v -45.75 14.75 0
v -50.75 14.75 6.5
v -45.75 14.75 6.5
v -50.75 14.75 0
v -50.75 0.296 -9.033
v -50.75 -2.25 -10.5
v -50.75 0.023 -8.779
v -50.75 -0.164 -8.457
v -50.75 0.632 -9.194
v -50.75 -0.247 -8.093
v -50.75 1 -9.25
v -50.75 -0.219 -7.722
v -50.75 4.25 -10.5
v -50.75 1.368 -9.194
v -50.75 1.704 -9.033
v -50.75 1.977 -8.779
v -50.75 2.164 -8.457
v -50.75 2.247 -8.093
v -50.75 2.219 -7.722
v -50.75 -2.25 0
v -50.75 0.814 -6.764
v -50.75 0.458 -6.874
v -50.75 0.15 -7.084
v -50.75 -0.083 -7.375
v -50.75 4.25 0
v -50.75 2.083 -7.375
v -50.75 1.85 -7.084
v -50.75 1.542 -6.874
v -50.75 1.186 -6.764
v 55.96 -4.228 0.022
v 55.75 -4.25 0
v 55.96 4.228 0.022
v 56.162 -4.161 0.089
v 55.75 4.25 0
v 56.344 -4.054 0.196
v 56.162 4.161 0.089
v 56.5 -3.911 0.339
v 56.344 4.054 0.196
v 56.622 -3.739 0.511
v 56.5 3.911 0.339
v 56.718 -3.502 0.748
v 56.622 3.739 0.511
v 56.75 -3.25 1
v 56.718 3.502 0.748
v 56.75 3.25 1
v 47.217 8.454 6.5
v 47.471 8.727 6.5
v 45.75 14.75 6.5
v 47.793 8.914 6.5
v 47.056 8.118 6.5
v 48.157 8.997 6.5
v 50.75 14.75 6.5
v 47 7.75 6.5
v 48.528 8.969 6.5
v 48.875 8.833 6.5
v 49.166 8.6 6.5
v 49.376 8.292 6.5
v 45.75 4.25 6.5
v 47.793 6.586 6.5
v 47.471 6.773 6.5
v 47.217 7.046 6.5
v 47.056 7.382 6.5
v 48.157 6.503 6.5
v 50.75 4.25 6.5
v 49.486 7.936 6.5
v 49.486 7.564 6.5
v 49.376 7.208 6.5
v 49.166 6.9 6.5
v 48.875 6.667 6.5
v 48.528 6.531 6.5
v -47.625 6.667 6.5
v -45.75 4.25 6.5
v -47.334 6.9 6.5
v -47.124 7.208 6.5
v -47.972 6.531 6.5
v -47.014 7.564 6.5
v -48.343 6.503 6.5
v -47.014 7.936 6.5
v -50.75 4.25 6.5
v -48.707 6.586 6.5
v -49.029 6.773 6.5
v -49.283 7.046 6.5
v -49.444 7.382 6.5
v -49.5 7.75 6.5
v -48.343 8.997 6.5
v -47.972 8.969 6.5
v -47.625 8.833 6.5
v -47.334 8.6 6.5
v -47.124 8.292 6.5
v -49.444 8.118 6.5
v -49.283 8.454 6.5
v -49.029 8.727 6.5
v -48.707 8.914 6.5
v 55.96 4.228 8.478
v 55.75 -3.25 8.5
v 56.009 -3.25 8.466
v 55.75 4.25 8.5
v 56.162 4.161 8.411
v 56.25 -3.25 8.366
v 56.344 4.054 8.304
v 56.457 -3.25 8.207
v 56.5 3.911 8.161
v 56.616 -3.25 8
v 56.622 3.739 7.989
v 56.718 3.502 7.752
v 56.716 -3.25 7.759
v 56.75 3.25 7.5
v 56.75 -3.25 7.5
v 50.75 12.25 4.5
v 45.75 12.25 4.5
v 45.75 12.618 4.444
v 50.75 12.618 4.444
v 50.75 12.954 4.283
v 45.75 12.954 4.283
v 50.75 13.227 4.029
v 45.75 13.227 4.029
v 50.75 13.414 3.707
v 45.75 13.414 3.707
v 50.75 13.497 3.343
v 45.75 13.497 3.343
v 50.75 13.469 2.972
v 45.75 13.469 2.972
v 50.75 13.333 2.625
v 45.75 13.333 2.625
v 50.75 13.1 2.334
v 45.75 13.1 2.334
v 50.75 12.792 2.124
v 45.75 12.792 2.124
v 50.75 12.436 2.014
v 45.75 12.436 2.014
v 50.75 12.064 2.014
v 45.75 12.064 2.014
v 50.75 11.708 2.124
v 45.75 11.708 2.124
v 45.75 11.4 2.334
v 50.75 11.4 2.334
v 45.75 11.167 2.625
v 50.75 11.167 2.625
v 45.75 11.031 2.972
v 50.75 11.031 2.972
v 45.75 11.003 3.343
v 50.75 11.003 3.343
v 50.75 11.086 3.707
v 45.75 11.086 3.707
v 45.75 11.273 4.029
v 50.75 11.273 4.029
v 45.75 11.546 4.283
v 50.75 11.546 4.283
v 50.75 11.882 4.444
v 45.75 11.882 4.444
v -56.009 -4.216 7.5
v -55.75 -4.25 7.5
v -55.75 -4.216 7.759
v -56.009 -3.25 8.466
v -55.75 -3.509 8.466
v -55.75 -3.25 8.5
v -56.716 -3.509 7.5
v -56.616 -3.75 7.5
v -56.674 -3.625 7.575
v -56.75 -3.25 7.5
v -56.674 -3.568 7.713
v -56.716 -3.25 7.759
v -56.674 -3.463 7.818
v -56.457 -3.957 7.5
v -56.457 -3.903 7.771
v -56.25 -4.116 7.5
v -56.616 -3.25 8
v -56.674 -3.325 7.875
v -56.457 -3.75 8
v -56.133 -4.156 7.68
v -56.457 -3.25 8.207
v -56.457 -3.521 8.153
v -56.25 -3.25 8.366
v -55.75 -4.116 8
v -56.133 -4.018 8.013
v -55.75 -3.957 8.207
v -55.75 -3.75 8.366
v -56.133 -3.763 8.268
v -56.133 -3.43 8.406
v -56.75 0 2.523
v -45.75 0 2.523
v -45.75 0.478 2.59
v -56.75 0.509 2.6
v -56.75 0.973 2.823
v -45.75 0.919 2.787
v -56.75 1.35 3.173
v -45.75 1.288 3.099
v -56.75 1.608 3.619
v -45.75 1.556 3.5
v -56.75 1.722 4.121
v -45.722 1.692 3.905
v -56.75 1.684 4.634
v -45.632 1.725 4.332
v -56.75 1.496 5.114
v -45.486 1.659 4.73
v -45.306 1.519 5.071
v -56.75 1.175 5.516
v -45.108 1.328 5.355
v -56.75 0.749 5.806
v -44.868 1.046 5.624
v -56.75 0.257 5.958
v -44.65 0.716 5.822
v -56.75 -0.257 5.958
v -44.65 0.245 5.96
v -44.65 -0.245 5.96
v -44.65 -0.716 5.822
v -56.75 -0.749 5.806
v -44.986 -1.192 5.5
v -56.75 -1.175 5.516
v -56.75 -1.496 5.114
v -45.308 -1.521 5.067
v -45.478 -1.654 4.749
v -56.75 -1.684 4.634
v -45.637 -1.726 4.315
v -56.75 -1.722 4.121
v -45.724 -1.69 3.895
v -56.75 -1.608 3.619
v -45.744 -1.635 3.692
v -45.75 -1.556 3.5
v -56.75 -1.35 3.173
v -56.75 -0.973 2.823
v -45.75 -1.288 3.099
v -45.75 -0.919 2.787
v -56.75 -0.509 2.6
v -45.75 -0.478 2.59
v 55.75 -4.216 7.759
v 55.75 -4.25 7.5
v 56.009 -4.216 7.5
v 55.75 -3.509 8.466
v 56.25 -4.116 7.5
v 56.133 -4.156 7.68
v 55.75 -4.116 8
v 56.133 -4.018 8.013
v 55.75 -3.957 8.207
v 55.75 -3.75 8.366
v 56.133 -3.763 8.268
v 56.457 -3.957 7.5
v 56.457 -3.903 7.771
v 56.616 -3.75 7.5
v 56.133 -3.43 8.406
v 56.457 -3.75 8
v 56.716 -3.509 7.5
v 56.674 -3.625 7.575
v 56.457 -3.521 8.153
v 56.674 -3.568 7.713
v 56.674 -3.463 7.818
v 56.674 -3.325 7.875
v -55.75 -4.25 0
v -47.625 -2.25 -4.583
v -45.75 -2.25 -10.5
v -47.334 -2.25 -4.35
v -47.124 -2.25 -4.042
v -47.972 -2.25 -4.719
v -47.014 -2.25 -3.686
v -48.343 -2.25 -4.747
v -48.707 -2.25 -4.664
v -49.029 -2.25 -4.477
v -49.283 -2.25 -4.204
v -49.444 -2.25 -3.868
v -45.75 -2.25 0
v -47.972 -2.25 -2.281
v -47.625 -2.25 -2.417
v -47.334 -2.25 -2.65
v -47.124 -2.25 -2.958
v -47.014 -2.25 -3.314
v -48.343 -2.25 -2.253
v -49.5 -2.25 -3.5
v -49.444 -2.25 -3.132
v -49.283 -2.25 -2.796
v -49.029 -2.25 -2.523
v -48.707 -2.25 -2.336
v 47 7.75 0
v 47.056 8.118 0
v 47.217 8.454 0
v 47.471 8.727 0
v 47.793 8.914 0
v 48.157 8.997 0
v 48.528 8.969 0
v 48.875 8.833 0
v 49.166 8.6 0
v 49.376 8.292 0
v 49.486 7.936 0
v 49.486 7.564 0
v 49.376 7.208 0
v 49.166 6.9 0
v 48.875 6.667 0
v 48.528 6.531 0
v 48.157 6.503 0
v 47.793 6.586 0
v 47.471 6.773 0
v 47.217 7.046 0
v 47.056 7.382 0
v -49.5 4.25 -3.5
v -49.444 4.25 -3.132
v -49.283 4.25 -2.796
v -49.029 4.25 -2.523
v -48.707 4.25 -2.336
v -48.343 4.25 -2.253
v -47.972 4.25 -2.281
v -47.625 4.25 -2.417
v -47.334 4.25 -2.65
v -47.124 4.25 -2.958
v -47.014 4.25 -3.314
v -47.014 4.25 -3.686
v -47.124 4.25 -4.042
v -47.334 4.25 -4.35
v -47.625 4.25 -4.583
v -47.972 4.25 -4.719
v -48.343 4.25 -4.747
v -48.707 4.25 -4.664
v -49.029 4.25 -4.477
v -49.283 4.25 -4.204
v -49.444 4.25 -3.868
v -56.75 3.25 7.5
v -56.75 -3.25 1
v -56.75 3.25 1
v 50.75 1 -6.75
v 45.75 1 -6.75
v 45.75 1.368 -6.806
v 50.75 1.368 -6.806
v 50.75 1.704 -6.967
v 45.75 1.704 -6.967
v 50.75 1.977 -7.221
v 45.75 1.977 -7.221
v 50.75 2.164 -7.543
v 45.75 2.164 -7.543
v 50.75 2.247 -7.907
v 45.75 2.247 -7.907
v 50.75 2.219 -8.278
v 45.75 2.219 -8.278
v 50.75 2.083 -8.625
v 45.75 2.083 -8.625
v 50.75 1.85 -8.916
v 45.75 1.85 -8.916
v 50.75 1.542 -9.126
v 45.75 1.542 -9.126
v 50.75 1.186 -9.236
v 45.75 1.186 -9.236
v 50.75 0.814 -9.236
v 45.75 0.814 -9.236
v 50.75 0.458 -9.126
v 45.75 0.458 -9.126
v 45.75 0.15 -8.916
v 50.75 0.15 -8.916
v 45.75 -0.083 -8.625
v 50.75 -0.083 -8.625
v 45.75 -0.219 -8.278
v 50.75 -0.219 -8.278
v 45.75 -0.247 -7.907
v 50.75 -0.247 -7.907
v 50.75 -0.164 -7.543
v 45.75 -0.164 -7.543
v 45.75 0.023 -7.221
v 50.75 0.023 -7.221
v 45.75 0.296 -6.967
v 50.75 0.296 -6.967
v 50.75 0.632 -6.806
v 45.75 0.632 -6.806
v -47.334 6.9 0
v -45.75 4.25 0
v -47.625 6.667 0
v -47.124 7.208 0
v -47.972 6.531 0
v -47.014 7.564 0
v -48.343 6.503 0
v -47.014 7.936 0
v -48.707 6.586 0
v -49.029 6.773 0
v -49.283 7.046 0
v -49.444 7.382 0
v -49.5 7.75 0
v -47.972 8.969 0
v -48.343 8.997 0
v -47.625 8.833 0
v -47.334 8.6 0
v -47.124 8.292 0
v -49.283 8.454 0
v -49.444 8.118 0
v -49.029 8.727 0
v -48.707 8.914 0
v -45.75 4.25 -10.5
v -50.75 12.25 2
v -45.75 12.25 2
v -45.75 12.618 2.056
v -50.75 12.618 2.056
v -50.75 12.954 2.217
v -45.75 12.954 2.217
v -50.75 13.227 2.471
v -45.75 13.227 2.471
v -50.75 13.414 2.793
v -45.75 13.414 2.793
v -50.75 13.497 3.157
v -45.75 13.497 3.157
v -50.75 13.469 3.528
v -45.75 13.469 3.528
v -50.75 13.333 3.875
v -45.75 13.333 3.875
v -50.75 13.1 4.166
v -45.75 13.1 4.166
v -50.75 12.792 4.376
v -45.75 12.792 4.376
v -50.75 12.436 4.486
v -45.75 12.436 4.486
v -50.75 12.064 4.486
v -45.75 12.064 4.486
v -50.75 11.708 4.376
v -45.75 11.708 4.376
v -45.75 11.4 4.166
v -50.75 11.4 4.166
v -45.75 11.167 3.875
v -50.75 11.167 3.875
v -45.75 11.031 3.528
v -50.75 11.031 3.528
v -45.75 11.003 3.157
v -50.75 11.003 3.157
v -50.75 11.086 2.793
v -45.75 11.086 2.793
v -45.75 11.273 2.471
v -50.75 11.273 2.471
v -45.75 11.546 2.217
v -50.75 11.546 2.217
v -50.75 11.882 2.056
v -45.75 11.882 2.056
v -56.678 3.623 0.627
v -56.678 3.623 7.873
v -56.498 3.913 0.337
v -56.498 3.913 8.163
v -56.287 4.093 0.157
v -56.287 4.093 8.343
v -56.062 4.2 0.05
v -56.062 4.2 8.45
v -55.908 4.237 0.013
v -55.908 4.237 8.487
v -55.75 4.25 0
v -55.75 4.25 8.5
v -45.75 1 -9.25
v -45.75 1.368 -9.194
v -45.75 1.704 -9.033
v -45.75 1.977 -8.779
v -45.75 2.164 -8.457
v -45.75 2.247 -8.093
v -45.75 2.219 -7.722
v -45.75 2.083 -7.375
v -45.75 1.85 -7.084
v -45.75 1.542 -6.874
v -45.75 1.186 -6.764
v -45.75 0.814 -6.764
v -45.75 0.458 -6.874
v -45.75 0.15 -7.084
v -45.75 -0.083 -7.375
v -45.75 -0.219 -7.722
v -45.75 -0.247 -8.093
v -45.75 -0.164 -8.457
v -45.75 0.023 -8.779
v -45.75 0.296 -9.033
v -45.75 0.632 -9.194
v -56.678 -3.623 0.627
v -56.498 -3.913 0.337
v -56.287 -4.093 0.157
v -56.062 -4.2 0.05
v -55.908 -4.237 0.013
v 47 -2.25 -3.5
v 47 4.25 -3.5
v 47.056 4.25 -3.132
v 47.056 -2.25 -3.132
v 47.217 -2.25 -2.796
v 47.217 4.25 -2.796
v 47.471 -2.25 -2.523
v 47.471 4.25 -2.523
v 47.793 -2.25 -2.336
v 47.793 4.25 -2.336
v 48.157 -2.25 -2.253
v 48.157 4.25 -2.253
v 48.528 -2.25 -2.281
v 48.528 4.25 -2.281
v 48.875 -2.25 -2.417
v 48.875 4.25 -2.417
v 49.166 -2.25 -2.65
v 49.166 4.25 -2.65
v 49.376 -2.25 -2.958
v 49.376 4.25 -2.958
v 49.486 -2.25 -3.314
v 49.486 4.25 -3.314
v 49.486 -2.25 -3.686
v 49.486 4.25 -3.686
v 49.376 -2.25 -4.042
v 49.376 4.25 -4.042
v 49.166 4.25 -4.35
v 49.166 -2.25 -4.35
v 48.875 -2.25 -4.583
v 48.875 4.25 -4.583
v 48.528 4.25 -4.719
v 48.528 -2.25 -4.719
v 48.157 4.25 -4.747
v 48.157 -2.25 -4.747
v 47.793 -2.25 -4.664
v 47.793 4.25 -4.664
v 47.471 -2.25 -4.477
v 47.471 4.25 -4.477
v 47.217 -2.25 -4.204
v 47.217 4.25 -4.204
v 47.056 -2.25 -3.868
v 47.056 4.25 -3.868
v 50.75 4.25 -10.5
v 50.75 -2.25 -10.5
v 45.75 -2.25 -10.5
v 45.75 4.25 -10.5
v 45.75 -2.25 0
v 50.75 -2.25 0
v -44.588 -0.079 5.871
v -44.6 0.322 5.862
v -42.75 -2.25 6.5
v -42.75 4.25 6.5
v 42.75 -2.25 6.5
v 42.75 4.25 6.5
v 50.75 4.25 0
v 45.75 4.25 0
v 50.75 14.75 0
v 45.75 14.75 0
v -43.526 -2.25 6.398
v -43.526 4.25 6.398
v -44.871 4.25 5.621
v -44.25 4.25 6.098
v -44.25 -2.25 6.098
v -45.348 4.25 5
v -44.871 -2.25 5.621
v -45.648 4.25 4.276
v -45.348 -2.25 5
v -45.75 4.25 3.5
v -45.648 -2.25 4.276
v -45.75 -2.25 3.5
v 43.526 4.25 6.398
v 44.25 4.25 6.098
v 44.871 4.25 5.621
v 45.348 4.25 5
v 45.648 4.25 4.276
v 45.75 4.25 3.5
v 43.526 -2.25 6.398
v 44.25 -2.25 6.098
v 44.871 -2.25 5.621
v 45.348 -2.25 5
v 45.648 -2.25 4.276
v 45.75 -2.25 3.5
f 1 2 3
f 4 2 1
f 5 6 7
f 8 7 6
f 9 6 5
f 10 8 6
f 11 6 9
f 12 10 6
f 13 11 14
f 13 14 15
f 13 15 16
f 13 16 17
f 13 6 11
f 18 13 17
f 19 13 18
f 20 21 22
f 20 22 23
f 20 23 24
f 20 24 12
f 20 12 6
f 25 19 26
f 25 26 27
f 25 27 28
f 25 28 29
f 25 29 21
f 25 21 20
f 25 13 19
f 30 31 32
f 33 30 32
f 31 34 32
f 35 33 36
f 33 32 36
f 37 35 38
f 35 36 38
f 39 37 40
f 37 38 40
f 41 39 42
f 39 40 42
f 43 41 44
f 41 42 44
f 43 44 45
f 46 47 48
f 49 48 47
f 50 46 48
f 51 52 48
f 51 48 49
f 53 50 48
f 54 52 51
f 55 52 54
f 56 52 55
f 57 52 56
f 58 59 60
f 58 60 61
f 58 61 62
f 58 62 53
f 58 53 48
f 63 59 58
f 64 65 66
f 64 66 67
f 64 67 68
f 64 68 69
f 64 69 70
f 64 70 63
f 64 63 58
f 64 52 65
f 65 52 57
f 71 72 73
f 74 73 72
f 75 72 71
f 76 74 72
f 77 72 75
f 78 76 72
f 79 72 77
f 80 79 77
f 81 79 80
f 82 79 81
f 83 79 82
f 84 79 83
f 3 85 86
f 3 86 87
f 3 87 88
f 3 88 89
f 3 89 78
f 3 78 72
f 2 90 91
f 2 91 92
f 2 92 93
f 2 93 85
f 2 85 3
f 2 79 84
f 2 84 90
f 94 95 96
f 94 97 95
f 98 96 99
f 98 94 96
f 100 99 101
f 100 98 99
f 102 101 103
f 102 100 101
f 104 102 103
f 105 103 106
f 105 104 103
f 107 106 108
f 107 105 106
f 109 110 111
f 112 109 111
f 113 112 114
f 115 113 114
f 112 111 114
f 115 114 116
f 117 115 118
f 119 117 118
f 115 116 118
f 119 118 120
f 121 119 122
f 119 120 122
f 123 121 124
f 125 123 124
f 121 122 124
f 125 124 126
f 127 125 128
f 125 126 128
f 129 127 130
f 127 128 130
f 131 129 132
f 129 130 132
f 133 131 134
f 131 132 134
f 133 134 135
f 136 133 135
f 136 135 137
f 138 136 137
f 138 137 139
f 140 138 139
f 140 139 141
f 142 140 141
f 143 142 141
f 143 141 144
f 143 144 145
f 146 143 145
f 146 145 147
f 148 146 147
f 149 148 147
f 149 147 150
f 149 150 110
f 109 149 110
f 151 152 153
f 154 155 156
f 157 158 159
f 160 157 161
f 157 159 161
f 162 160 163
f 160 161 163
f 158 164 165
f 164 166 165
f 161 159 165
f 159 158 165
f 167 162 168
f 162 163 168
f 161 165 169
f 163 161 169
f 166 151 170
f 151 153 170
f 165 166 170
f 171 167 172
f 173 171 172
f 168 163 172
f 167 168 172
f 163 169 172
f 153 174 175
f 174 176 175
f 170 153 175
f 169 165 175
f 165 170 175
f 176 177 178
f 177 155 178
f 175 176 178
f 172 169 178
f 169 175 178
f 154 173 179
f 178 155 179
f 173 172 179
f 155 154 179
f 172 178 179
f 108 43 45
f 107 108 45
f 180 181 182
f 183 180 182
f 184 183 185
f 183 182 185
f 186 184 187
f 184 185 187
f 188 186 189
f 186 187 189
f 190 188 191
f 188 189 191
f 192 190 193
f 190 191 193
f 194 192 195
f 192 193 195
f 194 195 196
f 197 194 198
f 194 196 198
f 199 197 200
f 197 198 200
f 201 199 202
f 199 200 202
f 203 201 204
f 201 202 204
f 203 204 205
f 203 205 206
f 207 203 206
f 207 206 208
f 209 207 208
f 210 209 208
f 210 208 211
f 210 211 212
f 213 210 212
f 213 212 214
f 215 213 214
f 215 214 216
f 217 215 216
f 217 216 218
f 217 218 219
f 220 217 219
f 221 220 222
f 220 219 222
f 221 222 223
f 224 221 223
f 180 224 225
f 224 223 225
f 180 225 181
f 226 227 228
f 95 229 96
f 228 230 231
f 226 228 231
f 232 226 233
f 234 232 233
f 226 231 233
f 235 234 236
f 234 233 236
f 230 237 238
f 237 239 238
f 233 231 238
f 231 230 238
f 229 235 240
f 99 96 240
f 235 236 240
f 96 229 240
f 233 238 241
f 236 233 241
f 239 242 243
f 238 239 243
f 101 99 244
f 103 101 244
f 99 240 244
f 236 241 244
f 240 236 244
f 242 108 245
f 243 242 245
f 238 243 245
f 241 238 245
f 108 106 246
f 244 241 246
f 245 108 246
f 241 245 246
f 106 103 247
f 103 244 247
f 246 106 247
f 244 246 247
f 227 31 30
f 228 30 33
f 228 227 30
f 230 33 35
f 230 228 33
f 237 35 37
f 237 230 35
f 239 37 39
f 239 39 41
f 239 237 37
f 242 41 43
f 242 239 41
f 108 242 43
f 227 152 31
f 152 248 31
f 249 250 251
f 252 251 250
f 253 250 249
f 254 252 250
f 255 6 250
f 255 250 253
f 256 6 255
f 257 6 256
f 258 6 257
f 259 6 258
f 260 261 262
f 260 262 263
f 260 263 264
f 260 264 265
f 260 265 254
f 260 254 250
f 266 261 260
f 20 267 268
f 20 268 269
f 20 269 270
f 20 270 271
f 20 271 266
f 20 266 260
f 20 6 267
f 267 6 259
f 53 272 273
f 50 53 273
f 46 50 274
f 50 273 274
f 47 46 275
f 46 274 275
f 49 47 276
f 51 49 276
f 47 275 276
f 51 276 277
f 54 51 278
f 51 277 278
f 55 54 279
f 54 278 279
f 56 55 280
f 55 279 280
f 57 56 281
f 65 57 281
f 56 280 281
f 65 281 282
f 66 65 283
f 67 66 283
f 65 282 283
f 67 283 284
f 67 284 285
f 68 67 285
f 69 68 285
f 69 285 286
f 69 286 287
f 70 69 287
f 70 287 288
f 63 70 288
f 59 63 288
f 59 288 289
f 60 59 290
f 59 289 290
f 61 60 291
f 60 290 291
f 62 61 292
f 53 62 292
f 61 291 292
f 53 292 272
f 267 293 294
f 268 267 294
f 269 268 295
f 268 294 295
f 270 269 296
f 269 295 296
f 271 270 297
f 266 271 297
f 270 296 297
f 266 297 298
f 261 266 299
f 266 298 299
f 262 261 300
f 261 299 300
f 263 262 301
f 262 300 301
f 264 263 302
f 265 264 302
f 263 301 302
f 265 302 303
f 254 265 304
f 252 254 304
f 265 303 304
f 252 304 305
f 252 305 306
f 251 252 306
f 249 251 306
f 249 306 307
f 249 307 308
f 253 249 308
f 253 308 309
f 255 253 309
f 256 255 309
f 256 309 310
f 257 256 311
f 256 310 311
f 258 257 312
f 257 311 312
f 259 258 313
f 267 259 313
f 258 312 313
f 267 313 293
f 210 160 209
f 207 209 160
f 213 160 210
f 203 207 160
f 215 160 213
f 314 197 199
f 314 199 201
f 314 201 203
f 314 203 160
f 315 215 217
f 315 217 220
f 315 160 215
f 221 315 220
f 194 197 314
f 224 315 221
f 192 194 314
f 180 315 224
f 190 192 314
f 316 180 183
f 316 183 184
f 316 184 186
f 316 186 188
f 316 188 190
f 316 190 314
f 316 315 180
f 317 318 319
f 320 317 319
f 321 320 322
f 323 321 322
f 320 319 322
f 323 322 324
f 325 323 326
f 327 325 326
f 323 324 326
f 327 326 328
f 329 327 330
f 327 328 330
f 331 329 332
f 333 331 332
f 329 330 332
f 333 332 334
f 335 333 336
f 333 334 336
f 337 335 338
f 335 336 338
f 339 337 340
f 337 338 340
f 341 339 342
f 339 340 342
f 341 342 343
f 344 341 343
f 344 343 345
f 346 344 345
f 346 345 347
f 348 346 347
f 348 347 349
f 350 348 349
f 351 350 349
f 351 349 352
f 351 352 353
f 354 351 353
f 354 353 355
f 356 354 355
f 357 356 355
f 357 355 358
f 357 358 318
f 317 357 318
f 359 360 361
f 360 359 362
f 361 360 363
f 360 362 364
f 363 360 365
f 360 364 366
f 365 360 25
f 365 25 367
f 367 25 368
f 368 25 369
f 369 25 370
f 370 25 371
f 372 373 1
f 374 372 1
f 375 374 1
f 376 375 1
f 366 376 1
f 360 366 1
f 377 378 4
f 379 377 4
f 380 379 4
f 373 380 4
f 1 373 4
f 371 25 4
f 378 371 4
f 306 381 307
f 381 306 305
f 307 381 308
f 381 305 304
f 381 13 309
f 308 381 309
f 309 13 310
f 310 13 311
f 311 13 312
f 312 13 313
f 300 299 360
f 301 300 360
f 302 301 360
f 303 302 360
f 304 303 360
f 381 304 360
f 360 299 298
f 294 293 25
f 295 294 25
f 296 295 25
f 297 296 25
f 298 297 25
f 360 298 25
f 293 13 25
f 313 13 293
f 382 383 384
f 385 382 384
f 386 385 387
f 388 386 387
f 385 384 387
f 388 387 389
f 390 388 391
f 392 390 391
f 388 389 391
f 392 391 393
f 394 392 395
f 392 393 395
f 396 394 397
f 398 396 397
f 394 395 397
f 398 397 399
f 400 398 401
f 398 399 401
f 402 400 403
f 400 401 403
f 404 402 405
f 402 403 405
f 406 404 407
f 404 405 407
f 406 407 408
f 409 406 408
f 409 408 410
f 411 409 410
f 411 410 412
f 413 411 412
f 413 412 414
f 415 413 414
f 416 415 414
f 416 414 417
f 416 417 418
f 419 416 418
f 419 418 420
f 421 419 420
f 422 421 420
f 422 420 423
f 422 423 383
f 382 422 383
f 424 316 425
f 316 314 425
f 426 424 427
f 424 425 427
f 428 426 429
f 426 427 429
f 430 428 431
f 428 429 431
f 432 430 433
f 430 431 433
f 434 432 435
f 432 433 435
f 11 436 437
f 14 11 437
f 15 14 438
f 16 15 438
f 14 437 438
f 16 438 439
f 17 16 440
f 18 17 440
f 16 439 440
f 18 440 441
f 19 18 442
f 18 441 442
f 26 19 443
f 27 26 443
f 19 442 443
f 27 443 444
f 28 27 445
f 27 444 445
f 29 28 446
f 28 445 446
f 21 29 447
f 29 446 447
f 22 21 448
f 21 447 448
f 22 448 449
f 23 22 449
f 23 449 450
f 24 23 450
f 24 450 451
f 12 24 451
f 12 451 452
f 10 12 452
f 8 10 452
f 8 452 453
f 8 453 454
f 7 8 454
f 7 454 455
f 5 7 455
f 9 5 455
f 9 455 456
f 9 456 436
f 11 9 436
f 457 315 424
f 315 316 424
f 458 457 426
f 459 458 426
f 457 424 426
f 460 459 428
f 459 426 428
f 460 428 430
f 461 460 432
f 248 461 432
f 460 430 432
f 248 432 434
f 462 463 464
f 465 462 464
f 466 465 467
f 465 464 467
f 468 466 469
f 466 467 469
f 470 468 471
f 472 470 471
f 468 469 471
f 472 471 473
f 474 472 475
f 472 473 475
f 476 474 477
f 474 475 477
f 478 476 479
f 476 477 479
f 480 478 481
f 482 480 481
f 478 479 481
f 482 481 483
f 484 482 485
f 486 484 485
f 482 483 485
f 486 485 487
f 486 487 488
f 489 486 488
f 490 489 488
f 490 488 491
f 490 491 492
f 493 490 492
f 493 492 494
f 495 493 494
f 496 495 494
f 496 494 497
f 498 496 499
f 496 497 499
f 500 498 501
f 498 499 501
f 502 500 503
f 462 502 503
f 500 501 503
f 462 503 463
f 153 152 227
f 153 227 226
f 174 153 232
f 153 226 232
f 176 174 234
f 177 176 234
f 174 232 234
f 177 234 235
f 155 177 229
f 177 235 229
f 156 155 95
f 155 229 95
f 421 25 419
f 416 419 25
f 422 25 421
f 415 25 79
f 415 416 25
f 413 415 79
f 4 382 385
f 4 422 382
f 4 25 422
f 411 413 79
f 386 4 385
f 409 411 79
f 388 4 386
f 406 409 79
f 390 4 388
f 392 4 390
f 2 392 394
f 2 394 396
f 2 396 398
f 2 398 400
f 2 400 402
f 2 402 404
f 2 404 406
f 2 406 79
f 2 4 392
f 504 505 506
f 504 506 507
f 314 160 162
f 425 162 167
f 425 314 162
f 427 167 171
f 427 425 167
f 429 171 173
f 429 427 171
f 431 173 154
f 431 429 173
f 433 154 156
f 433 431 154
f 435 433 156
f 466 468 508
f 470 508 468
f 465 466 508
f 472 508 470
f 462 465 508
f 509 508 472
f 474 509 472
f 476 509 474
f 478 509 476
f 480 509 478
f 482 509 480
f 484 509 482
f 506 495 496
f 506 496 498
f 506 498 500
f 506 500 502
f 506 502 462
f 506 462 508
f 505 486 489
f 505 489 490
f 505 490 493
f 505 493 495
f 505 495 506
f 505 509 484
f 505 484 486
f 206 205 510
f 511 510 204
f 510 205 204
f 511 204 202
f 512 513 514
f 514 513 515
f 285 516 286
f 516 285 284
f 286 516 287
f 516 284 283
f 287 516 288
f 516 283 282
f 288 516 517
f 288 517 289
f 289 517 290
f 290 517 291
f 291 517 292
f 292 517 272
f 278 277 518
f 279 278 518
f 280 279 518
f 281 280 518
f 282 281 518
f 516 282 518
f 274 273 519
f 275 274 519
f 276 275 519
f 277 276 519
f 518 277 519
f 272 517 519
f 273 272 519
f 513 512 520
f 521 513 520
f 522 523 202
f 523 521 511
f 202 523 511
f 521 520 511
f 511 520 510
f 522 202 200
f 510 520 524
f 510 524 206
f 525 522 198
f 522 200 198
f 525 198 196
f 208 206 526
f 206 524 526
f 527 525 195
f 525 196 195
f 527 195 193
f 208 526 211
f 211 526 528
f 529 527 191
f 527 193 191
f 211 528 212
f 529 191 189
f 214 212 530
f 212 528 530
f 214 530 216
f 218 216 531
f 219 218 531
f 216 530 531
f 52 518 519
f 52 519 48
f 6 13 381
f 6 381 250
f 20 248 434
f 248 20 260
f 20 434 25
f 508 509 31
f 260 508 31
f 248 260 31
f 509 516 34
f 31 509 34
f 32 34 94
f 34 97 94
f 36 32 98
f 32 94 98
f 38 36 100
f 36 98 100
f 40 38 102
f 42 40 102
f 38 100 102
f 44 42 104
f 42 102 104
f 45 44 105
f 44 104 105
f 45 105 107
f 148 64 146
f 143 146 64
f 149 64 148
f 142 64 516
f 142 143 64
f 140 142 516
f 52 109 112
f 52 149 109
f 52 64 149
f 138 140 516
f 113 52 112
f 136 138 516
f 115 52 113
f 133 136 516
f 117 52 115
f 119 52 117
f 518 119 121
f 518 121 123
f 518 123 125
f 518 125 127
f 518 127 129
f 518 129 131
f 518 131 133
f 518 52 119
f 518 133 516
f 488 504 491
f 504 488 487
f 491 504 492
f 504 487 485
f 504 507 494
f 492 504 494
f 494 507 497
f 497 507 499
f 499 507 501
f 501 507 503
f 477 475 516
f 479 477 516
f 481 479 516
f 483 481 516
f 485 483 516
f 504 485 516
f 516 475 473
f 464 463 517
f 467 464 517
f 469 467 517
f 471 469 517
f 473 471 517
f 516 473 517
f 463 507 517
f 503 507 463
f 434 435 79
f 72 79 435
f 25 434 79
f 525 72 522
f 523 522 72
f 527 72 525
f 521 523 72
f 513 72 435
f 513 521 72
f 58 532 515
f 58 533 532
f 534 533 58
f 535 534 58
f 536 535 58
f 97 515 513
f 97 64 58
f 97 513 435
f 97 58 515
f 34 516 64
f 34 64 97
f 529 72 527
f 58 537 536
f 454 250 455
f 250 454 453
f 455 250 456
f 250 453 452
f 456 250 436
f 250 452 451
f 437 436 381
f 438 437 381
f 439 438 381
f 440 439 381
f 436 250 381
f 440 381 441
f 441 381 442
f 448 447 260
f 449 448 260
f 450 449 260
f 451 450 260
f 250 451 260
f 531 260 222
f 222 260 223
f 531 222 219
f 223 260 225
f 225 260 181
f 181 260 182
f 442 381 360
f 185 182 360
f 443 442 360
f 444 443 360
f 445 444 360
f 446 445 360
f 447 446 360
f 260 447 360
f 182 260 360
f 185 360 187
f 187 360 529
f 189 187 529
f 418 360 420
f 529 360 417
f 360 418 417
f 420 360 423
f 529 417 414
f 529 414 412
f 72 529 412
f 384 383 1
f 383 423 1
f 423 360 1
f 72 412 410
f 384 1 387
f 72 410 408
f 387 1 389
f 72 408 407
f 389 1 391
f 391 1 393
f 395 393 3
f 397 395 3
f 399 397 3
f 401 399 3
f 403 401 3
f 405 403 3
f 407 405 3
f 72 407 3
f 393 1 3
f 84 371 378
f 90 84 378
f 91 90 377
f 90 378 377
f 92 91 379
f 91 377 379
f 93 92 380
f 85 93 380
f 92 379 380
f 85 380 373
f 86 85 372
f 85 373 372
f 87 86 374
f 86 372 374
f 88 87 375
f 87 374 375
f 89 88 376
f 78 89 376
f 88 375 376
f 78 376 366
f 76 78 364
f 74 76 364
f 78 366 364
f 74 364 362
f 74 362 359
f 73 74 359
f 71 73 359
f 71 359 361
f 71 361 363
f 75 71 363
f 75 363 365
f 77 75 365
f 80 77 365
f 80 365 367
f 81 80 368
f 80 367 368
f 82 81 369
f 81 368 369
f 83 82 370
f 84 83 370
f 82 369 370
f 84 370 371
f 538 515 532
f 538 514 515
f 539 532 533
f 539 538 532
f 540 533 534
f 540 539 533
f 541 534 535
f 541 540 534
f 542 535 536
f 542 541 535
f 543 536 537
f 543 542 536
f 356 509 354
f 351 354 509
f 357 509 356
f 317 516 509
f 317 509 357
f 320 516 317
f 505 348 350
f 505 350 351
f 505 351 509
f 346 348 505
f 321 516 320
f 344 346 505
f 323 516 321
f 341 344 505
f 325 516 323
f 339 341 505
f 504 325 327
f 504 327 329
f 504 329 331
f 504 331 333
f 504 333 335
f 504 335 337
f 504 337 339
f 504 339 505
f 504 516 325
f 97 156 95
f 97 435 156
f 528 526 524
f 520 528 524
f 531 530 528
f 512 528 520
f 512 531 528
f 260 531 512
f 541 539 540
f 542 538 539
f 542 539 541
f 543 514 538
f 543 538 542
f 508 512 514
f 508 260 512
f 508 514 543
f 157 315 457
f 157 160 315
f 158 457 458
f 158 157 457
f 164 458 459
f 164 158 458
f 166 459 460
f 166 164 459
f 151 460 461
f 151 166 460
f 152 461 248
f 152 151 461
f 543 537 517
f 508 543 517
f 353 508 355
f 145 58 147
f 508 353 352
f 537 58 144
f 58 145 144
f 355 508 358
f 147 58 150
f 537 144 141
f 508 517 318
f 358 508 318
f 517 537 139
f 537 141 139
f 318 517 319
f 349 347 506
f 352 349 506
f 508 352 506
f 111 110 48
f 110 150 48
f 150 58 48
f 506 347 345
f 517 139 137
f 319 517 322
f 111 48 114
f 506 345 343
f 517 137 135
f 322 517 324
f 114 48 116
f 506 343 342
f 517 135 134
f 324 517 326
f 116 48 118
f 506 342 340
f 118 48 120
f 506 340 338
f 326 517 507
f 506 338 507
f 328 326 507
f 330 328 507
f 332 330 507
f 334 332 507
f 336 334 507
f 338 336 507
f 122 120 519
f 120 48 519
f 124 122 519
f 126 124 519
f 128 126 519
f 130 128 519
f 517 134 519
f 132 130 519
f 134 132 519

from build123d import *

# Parameters (mm, degrees)
SKETCH1_W                 = 113.5
SKETCH1_H                 = 8.5
BOSS_EXTRUDE1_DEPTH       = 8.5
BOSS_EXTRUDE2_DEPTH       = 5
BOSS_EXTRUDE3_DEPTH       = 5
SKETCH13_W                = 91.5
SKETCH13_H                = 6.5
CUT_EXTRUDE1_DEPTH        = 6.5
M3X0_5_TAPPED_HOLE1_D     = 2.5
M3X0_5_TAPPED_HOLE1_DEPTH = 7.5
M3X0_5_TAPPED_HOLE1_TIP   = 0.751075774
M3X0_5_TAPPED_HOLE2_D     = 2.5
M3X0_5_TAPPED_HOLE2_DEPTH = 5
M3X0_5_TAPPED_HOLE3_D     = 2.5
M3X0_5_TAPPED_HOLE3_DEPTH = 5
M3X0_5_TAPPED_HOLE4_D     = 2.5
M3X0_5_TAPPED_HOLE4_DEPTH = 7.5
M3X0_5_TAPPED_HOLE4_TIP   = 0.751075774
FILLET1_R                 = 1
FILLET2_R                 = 1
FILLET3_R                 = 1
FILLET4_R                 = 3
M3X0_5_TAPPED_HOLE5_D     = 2.5
M3X0_5_TAPPED_HOLE5_DEPTH = 7.5
M3X0_5_TAPPED_HOLE5_TIP   = 0.751075774
M3X0_5_TAPPED_HOLE6_D     = 2.5
M3X0_5_TAPPED_HOLE6_DEPTH = 7.5
M3X0_5_TAPPED_HOLE6_TIP   = 0.751075774
M3X0_5_TAPPED_HOLE7_D     = 2.5
M3X0_5_TAPPED_HOLE7_DEPTH = 7.5
M3X0_5_TAPPED_HOLE7_TIP   = 0.751075774
M3X0_5_TAPPED_HOLE9_D     = 2.5
M3X0_5_TAPPED_HOLE9_DEPTH = 7.5
M3X0_5_TAPPED_HOLE9_TIP   = 0.751075774
SKETCH43_W                = 10.5
SKETCH43_H                = 10.5
CUT_EXTRUDE3_DEPTH        = 110.01404726
F_8_36_TAPPED_HOLE1_D     = 3.4544
F_8_36_TAPPED_HOLE1_DEPTH = 12.1
F_8_36_TAPPED_HOLE1_TIP   = 1.037806461


with BuildPart() as part:
    # Sketch1 → Boss-Extrude1 (new body)
    with BuildSketch(Plane.XY):
        Rectangle(SKETCH1_W, SKETCH1_H)
    extrude(amount=BOSS_EXTRUDE1_DEPTH)

    # Sketch4 → Boss-Extrude2 (add)
    with BuildSketch(Plane(origin=(50.75, 0, 0), x_dir=(0, 0, -1), z_dir=(1, 0, 0))):
        Polygon((0, -2.25), (10.5, -2.25), (10.5, 14.75), (-6.5, 14.75), (-6.5, 4.25), (0, 4.25), align=None)
    extrude(amount=-BOSS_EXTRUDE2_DEPTH)

    # Sketch12 → Boss-Extrude3 (add)
    with BuildSketch(Plane.ZY.offset(50.75)):
        Polygon((6.5, 4.25), (6.5, 14.75), (-10.5, 14.75), (-10.5, -2.25), (0, -2.25), (0, 4.25), align=None)
    extrude(amount=-BOSS_EXTRUDE3_DEPTH)

    # Sketch13 → Cut-Extrude1 (cut)
    with BuildSketch(Plane(origin=(0, 4.25, 0), x_dir=(1, 0, 0), z_dir=(0, 1, 0))):
        with Locations((0, -3.25)):
            Rectangle(SKETCH13_W, SKETCH13_H)
    extrude(amount=-CUT_EXTRUDE1_DEPTH, mode=Mode.SUBTRACT)

    # M3x0.5 Tapped Hole1
    with Locations(Plane.XY.offset(6.5)):
        with Locations((-48.25, 7.75)):
            Hole(M3X0_5_TAPPED_HOLE1_D / 2, depth=M3X0_5_TAPPED_HOLE1_DEPTH)
            with Locations((0, 0, -(M3X0_5_TAPPED_HOLE1_DEPTH + M3X0_5_TAPPED_HOLE1_TIP / 2))):  # 118° drill point
                Cone(0, M3X0_5_TAPPED_HOLE1_D / 2, M3X0_5_TAPPED_HOLE1_TIP, mode=Mode.SUBTRACT)

    # M3x0.5 Tapped Hole2
    with Locations(Plane.ZY.offset(50.75)):
        with Locations((3.25, 12.25)):
            Hole(M3X0_5_TAPPED_HOLE2_D / 2, depth=M3X0_5_TAPPED_HOLE2_DEPTH)

    # M3x0.5 Tapped Hole3
    with Locations(Plane.ZY.offset(50.75)):
        with Locations((-8, 1)):
            Hole(M3X0_5_TAPPED_HOLE3_D / 2, depth=M3X0_5_TAPPED_HOLE3_DEPTH)

    # M3x0.5 Tapped Hole4
    with Locations(Plane.XZ.offset(2.25)):
        with Locations((-48.25, -3.5)):
            Hole(M3X0_5_TAPPED_HOLE4_D / 2, depth=M3X0_5_TAPPED_HOLE4_DEPTH)
            with Locations((0, 0, -(M3X0_5_TAPPED_HOLE4_DEPTH + M3X0_5_TAPPED_HOLE4_TIP / 2))):  # 118° drill point
                Cone(0, M3X0_5_TAPPED_HOLE4_D / 2, M3X0_5_TAPPED_HOLE4_TIP, mode=Mode.SUBTRACT)

    # Fillet1
    fillet1_edges = [part.edges().sort_by_distance(p)[0] for p in [
        (0, -4.25, 8.5),
    ]]
    fillet(fillet1_edges, radius=FILLET1_R)

    # Fillet2
    fillet2_edges = [part.edges().sort_by_distance(p)[0] for p in [
        (-56.75, 0.5, 8.5),
        (-56.75, 0, 0),
        (-56.75, 4.25, 4.25),
        (-56.75, -4.25, 3.75),
        (-56.75, -3.957106781, 8.207106781),
    ]]
    fillet(fillet2_edges, radius=FILLET2_R)

    # Fillet3
    fillet3_edges = [part.edges().sort_by_distance(p)[0] for p in [
        (56.75, 0, 0),
        (56.75, 4.25, 4.25),
        (56.75, 0.5, 8.5),
        (56.75, -4.25, 3.75),
        (56.75, -3.957106781, 8.207106781),
    ]]
    fillet(fillet3_edges, radius=FILLET3_R)

    # Fillet4
    fillet4_edges = [part.edges().sort_by_distance(p)[0] for p in [
        (-45.75, 1, 6.5),
        (45.75, 1, 6.5),
    ]]
    fillet(fillet4_edges, radius=FILLET4_R)

    # M3x0.5 Tapped Hole5
    with Locations(Plane.XY.offset(6.5)):
        with Locations((48.25, 7.75)):
            Hole(M3X0_5_TAPPED_HOLE5_D / 2, depth=M3X0_5_TAPPED_HOLE5_DEPTH)
            with Locations((0, 0, -(M3X0_5_TAPPED_HOLE5_DEPTH + M3X0_5_TAPPED_HOLE5_TIP / 2))):  # 118° drill point
                Cone(0, M3X0_5_TAPPED_HOLE5_D / 2, M3X0_5_TAPPED_HOLE5_TIP, mode=Mode.SUBTRACT)

    # M3x0.5 Tapped Hole6
    with Locations(Plane.XZ.offset(2.25)):
        with Locations((48.25, -3.5)):
            Hole(M3X0_5_TAPPED_HOLE6_D / 2, depth=M3X0_5_TAPPED_HOLE6_DEPTH)
            with Locations((0, 0, -(M3X0_5_TAPPED_HOLE6_DEPTH + M3X0_5_TAPPED_HOLE6_TIP / 2))):  # 118° drill point
                Cone(0, M3X0_5_TAPPED_HOLE6_D / 2, M3X0_5_TAPPED_HOLE6_TIP, mode=Mode.SUBTRACT)

    # M3x0.5 Tapped Hole7
    with Locations(Plane(origin=(50.75, 0, 0), x_dir=(0, 0, -1), z_dir=(1, 0, 0))):
        with Locations((8, 1)):
            Hole(M3X0_5_TAPPED_HOLE7_D / 2, depth=M3X0_5_TAPPED_HOLE7_DEPTH)
            with Locations((0, 0, -(M3X0_5_TAPPED_HOLE7_DEPTH + M3X0_5_TAPPED_HOLE7_TIP / 2))):  # 118° drill point
                Cone(0, M3X0_5_TAPPED_HOLE7_D / 2, M3X0_5_TAPPED_HOLE7_TIP, mode=Mode.SUBTRACT)

    # M3x0.5 Tapped Hole9
    with Locations(Plane(origin=(50.75, 0, 0), x_dir=(0, 0, -1), z_dir=(1, 0, 0))):
        with Locations((-3.25, 12.25)):
            Hole(M3X0_5_TAPPED_HOLE9_D / 2, depth=M3X0_5_TAPPED_HOLE9_DEPTH)
            with Locations((0, 0, -(M3X0_5_TAPPED_HOLE9_DEPTH + M3X0_5_TAPPED_HOLE9_TIP / 2))):  # 118° drill point
                Cone(0, M3X0_5_TAPPED_HOLE9_D / 2, M3X0_5_TAPPED_HOLE9_TIP, mode=Mode.SUBTRACT)

    # Sketch43 → Cut-Extrude3 (cut, through all)
    with BuildSketch(Plane.ZY.offset(50.75)):
        with Locations((-5.25, 9.5)):
            Rectangle(SKETCH43_W, SKETCH43_H)
    extrude(amount=-CUT_EXTRUDE3_DEPTH, mode=Mode.SUBTRACT)

    # #8-36 Tapped Hole1
    with Locations(Plane.ZY.offset(56.75)):
        with Locations((4.25, 0)):
            Hole(F_8_36_TAPPED_HOLE1_D / 2, depth=F_8_36_TAPPED_HOLE1_DEPTH)
            with Locations((0, 0, -(F_8_36_TAPPED_HOLE1_DEPTH + F_8_36_TAPPED_HOLE1_TIP / 2))):  # 118° drill point
                Cone(0, F_8_36_TAPPED_HOLE1_D / 2, F_8_36_TAPPED_HOLE1_TIP, mode=Mode.SUBTRACT)


solid = part.part
